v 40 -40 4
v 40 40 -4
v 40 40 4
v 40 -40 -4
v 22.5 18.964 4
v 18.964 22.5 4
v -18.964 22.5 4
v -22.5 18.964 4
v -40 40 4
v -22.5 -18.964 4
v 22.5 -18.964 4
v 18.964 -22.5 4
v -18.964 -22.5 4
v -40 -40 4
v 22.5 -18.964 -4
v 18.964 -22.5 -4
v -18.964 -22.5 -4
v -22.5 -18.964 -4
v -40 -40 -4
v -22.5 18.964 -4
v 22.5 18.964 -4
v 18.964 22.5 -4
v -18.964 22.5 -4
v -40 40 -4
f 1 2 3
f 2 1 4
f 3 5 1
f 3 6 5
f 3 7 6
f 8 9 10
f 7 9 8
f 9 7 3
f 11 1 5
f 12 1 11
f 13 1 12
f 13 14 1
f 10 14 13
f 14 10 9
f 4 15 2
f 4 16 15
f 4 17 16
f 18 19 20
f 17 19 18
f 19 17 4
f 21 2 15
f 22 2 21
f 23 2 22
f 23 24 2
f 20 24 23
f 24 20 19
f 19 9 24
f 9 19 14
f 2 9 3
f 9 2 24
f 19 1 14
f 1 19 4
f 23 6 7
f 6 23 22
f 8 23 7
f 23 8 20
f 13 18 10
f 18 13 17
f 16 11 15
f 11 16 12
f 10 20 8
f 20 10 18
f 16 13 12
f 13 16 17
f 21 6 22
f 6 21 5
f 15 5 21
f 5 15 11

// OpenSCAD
thickness = 8;
frame_width = 80;

pickup_width = 45;
inner_width = pickup_width - (2 * sqrt(12.5));

$fn = 50;

module index()
{
	difference()
	{
		cube([ frame_width, frame_width, thickness ], center = true);

		hull()
		{
			cube([ pickup_width, inner_width, thickness ], center = true);
			cube([ inner_width, pickup_width, thickness ], center = true);
		}
	}
}

index();
